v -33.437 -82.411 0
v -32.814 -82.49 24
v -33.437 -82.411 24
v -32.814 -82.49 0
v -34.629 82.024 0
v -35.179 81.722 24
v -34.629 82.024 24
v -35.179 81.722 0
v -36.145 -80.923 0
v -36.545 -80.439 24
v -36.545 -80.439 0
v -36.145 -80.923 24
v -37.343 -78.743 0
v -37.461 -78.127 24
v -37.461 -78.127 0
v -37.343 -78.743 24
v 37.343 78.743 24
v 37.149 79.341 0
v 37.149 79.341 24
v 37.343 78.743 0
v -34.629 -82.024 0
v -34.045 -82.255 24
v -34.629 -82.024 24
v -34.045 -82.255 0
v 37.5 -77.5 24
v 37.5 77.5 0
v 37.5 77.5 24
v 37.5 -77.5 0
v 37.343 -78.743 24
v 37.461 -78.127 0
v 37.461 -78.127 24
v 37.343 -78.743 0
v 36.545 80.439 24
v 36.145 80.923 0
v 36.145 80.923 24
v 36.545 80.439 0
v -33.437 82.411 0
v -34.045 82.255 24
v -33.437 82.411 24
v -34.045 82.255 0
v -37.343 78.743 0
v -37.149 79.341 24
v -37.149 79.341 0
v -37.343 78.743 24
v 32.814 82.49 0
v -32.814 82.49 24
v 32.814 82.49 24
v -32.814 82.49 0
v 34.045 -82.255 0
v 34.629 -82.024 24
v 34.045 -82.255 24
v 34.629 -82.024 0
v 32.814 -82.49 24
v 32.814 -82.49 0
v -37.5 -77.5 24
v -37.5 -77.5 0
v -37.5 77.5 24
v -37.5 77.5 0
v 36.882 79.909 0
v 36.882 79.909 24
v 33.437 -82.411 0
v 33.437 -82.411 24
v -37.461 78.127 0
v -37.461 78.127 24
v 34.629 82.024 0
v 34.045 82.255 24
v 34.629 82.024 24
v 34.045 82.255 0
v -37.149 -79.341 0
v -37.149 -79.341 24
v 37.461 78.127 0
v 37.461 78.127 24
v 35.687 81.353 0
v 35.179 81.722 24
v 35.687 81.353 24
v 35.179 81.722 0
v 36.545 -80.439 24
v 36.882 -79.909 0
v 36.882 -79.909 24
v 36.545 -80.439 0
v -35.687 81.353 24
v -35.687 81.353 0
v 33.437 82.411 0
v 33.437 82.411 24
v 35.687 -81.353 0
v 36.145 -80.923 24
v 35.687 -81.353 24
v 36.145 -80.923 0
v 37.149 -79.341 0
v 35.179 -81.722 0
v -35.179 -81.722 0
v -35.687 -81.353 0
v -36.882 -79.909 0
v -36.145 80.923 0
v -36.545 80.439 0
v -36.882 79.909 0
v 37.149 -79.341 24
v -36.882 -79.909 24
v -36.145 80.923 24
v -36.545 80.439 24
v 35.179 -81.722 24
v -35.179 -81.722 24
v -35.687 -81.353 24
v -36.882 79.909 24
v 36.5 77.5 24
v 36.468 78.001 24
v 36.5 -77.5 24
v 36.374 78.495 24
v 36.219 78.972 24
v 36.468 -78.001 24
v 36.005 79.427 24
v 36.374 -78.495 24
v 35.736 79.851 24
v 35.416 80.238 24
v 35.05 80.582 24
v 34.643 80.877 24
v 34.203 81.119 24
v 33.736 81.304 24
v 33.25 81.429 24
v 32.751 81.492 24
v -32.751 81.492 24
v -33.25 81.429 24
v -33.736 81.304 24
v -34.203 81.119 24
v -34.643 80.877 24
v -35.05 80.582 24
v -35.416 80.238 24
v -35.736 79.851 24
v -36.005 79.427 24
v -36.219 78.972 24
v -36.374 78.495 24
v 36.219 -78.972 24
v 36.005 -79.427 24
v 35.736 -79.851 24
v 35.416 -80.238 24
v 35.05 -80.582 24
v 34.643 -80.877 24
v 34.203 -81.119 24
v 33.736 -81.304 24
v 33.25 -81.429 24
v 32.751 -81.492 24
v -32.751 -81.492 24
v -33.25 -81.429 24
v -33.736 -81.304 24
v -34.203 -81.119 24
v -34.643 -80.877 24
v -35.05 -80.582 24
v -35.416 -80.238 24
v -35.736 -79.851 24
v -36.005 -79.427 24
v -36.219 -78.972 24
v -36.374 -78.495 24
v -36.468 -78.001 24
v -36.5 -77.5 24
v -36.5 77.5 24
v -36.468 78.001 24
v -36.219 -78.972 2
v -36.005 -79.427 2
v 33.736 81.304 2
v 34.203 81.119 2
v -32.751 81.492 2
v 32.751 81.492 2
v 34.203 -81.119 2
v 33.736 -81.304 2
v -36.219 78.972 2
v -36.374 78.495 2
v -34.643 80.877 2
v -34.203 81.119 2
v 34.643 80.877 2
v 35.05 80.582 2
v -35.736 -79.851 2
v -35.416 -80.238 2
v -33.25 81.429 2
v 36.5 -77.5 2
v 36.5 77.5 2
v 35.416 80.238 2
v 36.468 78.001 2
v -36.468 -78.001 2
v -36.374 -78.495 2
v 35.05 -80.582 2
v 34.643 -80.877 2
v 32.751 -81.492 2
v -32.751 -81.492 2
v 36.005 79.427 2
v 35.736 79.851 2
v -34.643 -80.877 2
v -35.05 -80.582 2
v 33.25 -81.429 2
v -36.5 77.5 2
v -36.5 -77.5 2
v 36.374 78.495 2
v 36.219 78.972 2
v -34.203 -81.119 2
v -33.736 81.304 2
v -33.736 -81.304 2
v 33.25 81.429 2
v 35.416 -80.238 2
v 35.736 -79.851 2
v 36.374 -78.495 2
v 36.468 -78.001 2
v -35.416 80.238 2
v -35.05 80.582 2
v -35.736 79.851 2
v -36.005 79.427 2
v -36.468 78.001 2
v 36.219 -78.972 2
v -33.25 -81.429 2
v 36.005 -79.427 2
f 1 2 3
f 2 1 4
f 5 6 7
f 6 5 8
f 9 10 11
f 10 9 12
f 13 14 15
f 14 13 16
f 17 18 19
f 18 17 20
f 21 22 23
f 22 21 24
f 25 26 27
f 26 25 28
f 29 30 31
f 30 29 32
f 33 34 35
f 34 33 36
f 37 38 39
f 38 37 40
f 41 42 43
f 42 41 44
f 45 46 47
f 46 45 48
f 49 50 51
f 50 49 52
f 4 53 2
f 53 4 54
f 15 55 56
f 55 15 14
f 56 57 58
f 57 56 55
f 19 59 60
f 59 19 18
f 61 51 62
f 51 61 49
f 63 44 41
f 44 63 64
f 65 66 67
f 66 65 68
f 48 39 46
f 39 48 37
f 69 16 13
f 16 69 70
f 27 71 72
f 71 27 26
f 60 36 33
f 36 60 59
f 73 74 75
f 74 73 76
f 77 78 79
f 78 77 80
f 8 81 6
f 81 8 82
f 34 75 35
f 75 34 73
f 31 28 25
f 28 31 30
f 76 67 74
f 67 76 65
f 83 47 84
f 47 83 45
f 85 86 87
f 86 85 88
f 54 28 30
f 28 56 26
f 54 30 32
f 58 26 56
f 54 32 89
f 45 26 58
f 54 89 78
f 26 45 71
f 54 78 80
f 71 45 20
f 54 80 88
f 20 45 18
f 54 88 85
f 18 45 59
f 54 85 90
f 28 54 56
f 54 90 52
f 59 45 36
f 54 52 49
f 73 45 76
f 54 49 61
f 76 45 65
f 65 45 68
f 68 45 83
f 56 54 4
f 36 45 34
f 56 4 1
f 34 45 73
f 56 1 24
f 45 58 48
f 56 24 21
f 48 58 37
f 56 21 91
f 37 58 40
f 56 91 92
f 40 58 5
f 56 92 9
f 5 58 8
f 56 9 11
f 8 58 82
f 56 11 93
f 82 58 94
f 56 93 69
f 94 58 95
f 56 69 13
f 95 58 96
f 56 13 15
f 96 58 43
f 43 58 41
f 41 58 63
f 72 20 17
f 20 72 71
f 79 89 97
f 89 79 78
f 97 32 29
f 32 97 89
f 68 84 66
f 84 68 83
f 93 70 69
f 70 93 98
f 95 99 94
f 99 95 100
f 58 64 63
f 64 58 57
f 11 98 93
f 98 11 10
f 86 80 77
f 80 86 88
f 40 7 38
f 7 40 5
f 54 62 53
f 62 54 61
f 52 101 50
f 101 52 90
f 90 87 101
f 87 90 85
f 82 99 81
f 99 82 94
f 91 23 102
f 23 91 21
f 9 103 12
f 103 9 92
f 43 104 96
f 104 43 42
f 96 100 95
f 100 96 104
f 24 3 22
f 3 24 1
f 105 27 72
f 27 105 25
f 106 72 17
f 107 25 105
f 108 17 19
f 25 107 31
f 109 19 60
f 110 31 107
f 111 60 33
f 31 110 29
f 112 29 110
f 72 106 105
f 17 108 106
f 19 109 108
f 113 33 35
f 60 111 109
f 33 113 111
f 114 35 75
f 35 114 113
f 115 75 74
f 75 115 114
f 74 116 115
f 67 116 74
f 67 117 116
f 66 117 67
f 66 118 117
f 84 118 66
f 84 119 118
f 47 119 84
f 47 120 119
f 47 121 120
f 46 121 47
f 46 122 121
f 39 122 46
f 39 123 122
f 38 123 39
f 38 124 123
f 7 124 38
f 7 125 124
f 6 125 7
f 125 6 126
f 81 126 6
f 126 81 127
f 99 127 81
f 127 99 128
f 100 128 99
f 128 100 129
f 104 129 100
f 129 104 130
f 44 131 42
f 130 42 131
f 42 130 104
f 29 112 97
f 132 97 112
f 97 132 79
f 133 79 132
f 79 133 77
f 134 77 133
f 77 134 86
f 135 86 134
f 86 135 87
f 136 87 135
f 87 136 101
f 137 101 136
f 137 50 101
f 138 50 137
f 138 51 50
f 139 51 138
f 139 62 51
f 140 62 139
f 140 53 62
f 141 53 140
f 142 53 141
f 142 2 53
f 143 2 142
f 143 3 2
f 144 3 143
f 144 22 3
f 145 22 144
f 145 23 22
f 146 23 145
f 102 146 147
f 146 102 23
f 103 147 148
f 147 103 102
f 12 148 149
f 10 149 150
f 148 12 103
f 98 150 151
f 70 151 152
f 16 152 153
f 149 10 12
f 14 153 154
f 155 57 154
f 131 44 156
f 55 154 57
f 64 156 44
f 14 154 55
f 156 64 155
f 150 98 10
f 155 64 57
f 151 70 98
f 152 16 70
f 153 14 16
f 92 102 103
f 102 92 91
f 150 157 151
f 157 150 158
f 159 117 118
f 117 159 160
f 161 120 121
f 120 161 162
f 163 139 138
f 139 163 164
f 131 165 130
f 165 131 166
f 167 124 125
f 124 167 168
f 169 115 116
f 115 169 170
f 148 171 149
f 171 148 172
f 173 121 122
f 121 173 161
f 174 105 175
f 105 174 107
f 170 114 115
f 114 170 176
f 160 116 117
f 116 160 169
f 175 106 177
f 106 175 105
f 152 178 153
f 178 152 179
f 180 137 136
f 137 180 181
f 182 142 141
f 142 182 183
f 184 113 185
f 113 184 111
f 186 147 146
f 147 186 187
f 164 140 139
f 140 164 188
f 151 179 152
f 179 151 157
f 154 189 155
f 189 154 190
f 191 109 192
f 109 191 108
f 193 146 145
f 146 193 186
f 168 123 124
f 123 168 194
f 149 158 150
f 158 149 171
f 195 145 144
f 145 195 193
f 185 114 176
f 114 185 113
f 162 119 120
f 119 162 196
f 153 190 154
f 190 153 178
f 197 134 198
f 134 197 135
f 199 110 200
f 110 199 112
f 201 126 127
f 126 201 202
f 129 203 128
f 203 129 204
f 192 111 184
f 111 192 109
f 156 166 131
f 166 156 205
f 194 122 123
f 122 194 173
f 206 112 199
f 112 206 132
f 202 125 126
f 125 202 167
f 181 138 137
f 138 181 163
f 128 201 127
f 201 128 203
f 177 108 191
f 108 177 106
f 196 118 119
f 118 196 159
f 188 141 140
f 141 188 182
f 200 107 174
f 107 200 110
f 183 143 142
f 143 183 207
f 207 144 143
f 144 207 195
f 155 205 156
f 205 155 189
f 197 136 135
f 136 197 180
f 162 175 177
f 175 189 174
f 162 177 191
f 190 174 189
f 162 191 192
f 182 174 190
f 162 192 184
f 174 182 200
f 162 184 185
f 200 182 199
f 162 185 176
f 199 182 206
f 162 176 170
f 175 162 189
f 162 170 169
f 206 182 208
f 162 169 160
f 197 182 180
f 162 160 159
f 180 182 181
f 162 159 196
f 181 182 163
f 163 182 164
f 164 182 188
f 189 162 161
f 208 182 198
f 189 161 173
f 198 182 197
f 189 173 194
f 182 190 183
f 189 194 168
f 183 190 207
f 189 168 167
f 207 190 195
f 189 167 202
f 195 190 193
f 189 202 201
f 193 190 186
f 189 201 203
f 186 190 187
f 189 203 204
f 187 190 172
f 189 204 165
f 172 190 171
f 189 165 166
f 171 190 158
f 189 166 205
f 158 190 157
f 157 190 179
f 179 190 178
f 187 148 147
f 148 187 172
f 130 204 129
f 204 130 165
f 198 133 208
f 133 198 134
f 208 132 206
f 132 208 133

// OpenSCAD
$fn = 50;


difference() {
	union() {
		hull() {
			translate(v = [-32.5000000000, 77.5000000000, 0]) {
				cylinder(h = 24, r = 5);
			}
			translate(v = [32.5000000000, 77.5000000000, 0]) {
				cylinder(h = 24, r = 5);
			}
			translate(v = [-32.5000000000, -77.5000000000, 0]) {
				cylinder(h = 24, r = 5);
			}
			translate(v = [32.5000000000, -77.5000000000, 0]) {
				cylinder(h = 24, r = 5);
			}
		}
	}
	union() {
		translate(v = [0, 0, 2]) {
			hull() {
				translate(v = [-32.5000000000, 77.5000000000, 0]) {
					cylinder(h = 22, r = 4);
				}
				translate(v = [32.5000000000, 77.5000000000, 0]) {
					cylinder(h = 22, r = 4);
				}
				translate(v = [-32.5000000000, -77.5000000000, 0]) {
					cylinder(h = 22, r = 4);
				}
				translate(v = [32.5000000000, -77.5000000000, 0]) {
					cylinder(h = 22, r = 4);
				}
			}
		}
	}
}
